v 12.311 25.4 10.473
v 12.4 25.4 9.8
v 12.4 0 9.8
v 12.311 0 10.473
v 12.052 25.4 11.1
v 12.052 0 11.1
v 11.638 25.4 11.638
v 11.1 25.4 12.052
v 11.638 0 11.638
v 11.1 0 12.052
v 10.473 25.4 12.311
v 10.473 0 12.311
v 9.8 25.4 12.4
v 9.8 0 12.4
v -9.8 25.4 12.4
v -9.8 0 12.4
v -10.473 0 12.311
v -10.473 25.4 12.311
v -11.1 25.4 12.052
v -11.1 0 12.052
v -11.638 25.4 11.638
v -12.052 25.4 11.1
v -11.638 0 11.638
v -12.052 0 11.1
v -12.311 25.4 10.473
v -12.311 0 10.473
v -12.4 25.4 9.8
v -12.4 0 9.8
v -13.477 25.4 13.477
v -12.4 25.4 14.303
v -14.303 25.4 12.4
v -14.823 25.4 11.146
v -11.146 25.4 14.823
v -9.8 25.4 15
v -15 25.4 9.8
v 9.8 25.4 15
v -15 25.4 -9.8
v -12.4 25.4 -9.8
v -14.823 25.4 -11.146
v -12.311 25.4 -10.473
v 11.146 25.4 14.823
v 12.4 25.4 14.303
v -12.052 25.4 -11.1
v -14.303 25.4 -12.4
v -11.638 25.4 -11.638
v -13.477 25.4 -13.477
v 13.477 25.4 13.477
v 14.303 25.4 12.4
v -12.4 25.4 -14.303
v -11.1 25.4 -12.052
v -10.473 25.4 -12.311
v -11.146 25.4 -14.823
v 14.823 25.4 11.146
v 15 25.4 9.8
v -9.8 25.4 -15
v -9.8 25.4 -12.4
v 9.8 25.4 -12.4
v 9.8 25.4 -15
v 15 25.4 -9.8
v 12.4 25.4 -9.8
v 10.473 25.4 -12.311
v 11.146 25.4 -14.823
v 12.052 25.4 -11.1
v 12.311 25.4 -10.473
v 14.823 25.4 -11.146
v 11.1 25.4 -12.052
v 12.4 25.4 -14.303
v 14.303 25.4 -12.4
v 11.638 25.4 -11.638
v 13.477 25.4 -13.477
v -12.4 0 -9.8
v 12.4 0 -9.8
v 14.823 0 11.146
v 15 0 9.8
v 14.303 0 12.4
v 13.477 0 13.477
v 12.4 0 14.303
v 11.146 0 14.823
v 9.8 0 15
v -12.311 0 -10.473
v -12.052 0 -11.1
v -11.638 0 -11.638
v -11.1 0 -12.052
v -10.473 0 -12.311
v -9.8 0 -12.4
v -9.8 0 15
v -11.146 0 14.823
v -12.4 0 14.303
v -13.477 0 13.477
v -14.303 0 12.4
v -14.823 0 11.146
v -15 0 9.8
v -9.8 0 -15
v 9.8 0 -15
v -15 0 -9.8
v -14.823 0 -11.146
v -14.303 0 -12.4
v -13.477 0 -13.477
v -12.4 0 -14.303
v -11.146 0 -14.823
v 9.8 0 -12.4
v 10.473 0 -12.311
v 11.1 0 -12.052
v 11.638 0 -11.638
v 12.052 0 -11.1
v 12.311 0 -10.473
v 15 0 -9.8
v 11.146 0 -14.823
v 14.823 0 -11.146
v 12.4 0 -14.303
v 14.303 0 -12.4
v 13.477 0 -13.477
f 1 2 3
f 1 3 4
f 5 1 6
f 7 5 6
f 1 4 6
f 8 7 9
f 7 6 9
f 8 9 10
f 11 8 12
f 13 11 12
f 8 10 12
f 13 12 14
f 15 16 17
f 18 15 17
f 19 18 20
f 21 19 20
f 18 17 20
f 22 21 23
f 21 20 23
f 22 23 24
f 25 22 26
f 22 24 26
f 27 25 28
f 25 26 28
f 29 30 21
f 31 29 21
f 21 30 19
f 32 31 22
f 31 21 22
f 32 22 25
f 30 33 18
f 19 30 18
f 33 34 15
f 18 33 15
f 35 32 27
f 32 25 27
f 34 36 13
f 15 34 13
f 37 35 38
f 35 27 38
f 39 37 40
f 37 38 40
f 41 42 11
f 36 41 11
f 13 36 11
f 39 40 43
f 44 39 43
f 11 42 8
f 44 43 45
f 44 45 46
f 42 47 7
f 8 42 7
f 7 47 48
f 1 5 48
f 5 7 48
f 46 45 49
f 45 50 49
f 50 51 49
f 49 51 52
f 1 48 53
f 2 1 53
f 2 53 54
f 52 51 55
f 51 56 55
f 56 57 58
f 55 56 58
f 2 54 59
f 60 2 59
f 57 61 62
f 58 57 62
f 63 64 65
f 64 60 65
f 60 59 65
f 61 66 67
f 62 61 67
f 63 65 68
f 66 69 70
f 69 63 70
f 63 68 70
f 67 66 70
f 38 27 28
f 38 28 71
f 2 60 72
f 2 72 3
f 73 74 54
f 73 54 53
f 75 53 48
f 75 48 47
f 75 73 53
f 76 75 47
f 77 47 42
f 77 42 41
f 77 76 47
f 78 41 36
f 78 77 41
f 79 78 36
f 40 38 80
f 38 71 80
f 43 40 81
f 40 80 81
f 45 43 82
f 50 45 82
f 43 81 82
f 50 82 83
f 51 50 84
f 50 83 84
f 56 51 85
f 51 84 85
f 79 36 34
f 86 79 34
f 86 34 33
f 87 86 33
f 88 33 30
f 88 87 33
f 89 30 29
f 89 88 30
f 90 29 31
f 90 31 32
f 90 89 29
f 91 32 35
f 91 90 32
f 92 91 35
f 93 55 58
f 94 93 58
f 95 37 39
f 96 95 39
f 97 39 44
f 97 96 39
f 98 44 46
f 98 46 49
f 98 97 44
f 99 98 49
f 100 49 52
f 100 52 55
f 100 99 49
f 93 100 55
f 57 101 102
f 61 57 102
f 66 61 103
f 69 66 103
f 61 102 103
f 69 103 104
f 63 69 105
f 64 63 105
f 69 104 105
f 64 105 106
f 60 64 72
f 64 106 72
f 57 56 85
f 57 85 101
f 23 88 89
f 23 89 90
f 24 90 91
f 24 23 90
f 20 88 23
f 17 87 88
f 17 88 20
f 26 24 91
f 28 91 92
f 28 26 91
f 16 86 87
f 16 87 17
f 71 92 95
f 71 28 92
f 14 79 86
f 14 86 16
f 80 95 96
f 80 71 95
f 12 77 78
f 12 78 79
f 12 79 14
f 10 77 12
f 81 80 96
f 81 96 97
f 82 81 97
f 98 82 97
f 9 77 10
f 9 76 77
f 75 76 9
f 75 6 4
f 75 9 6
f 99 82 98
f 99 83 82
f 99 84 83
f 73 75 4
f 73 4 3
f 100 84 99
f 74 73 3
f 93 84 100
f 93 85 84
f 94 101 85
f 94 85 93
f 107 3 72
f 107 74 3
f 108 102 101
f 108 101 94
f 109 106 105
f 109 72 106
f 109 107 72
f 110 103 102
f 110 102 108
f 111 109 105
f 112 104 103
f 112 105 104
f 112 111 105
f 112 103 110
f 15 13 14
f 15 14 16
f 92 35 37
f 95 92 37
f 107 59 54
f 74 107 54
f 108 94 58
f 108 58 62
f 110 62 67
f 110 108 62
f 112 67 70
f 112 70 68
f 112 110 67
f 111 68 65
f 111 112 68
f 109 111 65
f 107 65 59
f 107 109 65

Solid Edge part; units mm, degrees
sketch "Sketch1" plane through (0, 0, 0) normal (0, -1, 0) x (1, 0, 0)
  line L0 (9.8, 12.4) -> (-9.8, 12.4)
  arc A0 (-9.8, 12.4) -> (-12.4, 9.8) centre (-9.8, 9.8) ccw
  line L1 (-12.4, 9.8) -> (-12.4, -9.8)
  arc A1 (-12.4, -9.8) -> (-9.8, -12.4) centre (-9.8, -9.8) ccw
  line L2 (-9.8, -12.4) -> (9.8, -12.4)
  arc A2 (9.8, -12.4) -> (12.4, -9.8) centre (9.8, -9.8) ccw
  line L3 (12.4, -9.8) -> (12.4, 9.8)
  arc A3 (12.4, 9.8) -> (9.8, 12.4) centre (9.8, 9.8) ccw
  arc A4 (-9.8, 15) -> (-15, 9.8) centre (-9.8, 9.8) ccw
  line L4 (-15, 9.8) -> (-15, -9.8)
  arc A5 (-15, -9.8) -> (-9.8, -15) centre (-9.8, -9.8) ccw
  line L5 (-9.8, -15) -> (9.8, -15)
  arc A6 (9.8, -15) -> (15, -9.8) centre (9.8, -9.8) ccw
  line L6 (15, -9.8) -> (15, 9.8)
  arc A7 (15, 9.8) -> (9.8, 15) centre (9.8, 9.8) ccw
  line L7 (9.8, 15) -> (-9.8, 15)
  dimension "D1" = 2.6
  dimension "D2" = 30
  dimension "D3" = 30
extrude "Protrusion1" add sketch "Sketch1" against normal blind 25.4
